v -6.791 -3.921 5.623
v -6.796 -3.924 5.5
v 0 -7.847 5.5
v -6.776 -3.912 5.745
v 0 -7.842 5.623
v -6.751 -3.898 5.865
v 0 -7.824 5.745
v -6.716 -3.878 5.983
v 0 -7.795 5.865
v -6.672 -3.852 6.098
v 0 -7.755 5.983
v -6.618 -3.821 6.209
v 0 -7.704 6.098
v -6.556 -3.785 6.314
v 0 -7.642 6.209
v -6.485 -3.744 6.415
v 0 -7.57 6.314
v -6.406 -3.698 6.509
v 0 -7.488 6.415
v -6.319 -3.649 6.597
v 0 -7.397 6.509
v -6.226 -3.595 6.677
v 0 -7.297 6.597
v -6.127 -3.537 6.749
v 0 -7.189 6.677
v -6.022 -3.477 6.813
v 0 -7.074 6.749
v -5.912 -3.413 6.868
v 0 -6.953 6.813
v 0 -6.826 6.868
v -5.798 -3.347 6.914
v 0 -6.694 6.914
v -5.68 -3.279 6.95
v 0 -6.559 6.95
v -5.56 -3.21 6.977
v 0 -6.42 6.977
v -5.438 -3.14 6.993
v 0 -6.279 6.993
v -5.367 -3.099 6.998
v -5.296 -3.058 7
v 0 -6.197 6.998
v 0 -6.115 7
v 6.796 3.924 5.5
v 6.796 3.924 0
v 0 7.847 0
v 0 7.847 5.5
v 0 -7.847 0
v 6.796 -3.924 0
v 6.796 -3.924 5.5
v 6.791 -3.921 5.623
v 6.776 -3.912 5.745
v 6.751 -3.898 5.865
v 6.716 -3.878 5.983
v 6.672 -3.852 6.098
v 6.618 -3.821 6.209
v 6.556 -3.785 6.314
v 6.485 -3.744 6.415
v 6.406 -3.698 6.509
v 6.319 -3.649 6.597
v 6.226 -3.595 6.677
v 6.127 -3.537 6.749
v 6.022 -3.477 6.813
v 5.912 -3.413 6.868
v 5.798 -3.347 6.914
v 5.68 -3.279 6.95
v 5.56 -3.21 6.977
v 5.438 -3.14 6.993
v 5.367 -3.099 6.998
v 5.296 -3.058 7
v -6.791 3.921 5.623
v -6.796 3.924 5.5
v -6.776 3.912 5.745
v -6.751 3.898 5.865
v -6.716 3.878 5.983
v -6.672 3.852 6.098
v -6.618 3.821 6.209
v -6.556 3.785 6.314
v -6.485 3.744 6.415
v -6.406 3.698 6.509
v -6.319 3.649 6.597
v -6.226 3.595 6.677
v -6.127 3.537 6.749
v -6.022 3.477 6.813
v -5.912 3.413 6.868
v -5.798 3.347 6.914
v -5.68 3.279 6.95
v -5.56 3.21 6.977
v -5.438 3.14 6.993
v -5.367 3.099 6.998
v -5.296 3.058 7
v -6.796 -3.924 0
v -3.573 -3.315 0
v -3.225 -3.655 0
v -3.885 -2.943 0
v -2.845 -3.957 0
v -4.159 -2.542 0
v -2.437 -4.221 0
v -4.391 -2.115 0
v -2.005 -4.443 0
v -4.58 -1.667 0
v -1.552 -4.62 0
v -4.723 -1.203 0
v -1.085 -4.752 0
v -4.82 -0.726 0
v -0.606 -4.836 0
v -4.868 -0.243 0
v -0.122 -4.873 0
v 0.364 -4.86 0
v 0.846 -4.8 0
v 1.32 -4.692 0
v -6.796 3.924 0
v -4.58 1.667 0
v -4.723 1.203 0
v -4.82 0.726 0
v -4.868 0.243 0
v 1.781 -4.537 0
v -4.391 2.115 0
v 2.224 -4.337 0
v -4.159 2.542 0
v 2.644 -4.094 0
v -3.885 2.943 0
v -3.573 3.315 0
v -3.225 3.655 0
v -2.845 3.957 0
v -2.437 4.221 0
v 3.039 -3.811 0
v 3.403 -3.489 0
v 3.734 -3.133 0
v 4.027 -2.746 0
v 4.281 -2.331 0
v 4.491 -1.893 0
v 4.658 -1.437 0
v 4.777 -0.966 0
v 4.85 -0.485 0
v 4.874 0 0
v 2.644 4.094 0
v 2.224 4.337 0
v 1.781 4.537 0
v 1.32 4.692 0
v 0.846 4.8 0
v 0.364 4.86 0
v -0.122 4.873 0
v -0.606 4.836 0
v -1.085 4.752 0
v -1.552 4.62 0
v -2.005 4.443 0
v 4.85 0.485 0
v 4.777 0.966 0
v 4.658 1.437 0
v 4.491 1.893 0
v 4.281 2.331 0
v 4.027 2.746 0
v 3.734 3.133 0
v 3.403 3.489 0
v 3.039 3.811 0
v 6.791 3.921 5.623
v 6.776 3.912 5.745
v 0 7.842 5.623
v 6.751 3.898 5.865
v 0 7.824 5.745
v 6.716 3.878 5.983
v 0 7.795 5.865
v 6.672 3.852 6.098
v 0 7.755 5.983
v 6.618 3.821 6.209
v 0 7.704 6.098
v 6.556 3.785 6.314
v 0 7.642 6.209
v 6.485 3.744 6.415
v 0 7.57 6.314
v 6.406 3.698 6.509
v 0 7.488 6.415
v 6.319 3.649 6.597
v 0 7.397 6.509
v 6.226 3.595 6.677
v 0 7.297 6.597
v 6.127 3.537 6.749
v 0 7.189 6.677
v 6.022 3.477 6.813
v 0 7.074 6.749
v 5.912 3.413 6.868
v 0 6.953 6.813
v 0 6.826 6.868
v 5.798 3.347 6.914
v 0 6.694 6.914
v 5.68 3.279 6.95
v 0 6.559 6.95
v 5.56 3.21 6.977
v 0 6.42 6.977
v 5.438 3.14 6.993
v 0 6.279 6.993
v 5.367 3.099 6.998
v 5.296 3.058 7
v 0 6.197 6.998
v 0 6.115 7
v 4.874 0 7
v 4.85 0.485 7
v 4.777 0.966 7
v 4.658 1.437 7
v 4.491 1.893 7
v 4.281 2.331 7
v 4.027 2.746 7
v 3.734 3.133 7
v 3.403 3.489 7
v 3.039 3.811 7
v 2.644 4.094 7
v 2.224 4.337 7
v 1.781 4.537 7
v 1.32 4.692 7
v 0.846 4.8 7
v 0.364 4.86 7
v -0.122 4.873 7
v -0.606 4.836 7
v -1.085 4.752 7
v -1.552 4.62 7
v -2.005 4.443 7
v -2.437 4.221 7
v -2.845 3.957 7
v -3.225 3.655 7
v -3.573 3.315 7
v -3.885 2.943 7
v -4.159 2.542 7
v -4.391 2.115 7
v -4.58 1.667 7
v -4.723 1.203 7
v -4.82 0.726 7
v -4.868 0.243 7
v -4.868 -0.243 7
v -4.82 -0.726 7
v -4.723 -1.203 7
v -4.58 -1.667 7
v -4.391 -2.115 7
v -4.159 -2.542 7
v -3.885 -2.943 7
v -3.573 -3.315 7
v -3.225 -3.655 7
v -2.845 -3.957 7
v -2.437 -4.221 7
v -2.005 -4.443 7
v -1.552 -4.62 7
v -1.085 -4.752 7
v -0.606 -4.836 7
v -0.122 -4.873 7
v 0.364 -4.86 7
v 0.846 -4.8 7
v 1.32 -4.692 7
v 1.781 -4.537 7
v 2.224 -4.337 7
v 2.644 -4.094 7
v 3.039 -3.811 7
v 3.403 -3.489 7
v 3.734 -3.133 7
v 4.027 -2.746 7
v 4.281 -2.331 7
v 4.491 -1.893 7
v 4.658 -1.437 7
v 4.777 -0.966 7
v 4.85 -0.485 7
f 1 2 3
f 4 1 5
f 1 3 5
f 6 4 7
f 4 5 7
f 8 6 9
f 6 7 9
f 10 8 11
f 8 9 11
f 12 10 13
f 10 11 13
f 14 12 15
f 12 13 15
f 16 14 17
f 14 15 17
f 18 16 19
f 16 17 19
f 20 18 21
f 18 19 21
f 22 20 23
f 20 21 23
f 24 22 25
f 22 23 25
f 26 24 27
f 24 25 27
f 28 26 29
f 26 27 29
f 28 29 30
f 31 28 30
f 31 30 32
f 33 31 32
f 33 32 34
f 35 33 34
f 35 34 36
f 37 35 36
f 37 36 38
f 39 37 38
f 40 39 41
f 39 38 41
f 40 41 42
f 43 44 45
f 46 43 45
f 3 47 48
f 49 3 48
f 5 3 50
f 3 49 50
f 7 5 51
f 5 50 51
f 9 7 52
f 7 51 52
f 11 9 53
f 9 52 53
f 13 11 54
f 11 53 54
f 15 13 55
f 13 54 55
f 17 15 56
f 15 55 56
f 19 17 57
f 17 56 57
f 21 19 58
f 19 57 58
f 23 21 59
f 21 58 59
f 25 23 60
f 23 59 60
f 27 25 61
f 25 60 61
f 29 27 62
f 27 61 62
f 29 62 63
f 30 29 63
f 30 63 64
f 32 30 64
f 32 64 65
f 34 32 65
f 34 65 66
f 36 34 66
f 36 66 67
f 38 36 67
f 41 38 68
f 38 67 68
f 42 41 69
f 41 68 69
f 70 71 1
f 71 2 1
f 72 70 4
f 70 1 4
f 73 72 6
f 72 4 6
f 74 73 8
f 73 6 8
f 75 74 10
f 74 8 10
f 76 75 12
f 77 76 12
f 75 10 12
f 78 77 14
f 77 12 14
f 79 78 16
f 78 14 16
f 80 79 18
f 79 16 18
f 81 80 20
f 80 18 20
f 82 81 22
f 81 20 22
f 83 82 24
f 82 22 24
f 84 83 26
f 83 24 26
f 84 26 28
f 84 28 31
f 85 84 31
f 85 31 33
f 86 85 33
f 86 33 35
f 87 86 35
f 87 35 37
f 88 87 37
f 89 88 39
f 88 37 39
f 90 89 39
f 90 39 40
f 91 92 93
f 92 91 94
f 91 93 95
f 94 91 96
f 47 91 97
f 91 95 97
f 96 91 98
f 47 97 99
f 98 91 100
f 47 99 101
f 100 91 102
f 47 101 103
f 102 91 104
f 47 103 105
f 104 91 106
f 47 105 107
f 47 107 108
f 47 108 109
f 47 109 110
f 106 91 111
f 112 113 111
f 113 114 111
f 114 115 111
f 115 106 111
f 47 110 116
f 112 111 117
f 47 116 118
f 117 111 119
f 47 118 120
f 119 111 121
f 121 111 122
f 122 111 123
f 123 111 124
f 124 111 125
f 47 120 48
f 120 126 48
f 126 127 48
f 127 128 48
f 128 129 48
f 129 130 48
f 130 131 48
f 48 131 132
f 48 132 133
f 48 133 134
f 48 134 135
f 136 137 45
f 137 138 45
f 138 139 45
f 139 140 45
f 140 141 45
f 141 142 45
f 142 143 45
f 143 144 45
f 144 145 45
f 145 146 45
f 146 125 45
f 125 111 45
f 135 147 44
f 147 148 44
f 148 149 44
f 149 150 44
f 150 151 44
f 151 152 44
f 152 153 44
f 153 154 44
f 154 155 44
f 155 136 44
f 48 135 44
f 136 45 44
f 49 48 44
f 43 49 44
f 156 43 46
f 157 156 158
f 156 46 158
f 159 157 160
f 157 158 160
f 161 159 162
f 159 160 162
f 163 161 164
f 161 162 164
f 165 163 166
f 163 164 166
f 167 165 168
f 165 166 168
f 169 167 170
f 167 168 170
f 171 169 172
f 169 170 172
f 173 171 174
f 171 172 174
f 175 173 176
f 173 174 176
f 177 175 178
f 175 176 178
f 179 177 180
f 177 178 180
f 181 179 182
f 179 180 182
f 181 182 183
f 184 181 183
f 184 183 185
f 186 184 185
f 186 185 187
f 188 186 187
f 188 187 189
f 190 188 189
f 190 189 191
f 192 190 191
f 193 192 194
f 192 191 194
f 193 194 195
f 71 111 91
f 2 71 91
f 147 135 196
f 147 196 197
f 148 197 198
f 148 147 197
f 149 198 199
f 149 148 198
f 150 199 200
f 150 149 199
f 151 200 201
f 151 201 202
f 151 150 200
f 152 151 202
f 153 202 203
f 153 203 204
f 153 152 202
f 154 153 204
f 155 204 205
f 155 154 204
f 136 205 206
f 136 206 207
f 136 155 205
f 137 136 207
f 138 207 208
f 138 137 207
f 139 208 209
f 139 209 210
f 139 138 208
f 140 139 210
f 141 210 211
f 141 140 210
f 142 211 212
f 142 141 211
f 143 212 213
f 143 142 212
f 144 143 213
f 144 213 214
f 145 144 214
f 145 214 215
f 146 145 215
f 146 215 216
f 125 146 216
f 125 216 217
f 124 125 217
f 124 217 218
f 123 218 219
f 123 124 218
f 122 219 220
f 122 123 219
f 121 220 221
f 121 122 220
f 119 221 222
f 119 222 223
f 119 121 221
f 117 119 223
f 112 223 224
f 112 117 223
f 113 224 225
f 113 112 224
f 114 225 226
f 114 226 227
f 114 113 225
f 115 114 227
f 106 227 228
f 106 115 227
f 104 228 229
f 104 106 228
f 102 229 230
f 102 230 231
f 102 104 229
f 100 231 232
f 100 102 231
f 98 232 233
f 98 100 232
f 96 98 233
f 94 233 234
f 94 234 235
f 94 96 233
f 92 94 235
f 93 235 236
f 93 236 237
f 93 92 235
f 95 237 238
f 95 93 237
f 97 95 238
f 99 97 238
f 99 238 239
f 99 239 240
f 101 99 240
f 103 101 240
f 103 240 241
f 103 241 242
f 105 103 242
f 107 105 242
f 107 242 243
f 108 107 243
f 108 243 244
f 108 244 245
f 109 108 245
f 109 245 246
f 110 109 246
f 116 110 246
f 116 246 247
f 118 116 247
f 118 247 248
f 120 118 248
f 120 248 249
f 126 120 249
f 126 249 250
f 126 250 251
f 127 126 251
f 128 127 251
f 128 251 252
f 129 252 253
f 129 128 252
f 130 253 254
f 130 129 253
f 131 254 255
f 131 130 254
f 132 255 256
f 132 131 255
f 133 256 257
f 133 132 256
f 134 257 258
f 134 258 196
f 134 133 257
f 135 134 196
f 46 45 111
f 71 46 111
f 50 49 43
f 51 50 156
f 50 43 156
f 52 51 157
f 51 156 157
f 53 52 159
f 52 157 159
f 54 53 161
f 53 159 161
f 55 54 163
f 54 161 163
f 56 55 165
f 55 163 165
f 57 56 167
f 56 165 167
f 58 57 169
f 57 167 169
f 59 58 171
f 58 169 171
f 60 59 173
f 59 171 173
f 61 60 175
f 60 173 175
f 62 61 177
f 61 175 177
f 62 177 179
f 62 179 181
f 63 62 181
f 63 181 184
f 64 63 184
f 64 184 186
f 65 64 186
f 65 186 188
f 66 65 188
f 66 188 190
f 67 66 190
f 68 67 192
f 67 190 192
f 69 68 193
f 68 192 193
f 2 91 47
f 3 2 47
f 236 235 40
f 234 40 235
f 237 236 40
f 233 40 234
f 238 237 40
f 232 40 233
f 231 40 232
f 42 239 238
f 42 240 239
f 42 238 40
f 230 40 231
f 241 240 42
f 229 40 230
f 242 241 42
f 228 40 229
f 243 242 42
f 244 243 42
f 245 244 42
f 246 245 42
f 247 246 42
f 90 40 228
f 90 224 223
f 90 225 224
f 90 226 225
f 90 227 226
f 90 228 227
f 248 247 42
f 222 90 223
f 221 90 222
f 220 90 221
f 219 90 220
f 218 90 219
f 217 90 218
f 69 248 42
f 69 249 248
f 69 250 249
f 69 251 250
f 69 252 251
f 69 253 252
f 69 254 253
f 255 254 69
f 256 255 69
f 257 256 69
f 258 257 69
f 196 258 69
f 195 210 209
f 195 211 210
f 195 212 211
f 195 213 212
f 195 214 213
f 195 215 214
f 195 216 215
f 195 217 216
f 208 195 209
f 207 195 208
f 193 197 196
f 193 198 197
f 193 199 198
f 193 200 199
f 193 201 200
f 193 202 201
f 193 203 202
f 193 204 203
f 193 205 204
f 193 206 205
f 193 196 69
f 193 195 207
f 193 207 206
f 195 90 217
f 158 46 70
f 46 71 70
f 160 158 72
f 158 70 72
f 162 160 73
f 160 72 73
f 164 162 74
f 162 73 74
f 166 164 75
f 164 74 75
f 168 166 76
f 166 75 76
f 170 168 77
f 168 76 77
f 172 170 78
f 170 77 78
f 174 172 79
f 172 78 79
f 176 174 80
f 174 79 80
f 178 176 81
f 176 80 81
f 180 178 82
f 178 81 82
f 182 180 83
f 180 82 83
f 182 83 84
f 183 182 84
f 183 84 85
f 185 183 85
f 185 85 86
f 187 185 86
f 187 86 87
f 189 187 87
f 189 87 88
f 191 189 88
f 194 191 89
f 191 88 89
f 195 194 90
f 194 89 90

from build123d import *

# Parameters (mm, degrees)
F0_R     = 4.874108
F1_DEPTH = 7
F2_R     = 1.5


with BuildPart() as f1:
    # F0 (on Top) → F1 (new body)
    with BuildSketch(Plane.XY):
        Polygon((6.795984, 3.923663), (0, 7.847326), (-6.795984, 3.923663), (-6.795984, -3.923663), (0, -7.847326), (6.795984, -3.923663), align=None)
        Circle(F0_R, mode=Mode.SUBTRACT)
    extrude(amount=F1_DEPTH)

    # F2
    f2_edges = [f1.edges().sort_by_distance(p)[0] for p in [
        (6.795984, 0, 7),
        (3.397992, -5.885494, 7),
        (-3.397992, -5.885494, 7),
        (3.397992, 5.885494, 7),
        (-6.795984, 0, 7),
        (-3.397992, 5.885494, 7),
    ]]
    fillet(f2_edges, radius=F2_R)


solid = f1.part
